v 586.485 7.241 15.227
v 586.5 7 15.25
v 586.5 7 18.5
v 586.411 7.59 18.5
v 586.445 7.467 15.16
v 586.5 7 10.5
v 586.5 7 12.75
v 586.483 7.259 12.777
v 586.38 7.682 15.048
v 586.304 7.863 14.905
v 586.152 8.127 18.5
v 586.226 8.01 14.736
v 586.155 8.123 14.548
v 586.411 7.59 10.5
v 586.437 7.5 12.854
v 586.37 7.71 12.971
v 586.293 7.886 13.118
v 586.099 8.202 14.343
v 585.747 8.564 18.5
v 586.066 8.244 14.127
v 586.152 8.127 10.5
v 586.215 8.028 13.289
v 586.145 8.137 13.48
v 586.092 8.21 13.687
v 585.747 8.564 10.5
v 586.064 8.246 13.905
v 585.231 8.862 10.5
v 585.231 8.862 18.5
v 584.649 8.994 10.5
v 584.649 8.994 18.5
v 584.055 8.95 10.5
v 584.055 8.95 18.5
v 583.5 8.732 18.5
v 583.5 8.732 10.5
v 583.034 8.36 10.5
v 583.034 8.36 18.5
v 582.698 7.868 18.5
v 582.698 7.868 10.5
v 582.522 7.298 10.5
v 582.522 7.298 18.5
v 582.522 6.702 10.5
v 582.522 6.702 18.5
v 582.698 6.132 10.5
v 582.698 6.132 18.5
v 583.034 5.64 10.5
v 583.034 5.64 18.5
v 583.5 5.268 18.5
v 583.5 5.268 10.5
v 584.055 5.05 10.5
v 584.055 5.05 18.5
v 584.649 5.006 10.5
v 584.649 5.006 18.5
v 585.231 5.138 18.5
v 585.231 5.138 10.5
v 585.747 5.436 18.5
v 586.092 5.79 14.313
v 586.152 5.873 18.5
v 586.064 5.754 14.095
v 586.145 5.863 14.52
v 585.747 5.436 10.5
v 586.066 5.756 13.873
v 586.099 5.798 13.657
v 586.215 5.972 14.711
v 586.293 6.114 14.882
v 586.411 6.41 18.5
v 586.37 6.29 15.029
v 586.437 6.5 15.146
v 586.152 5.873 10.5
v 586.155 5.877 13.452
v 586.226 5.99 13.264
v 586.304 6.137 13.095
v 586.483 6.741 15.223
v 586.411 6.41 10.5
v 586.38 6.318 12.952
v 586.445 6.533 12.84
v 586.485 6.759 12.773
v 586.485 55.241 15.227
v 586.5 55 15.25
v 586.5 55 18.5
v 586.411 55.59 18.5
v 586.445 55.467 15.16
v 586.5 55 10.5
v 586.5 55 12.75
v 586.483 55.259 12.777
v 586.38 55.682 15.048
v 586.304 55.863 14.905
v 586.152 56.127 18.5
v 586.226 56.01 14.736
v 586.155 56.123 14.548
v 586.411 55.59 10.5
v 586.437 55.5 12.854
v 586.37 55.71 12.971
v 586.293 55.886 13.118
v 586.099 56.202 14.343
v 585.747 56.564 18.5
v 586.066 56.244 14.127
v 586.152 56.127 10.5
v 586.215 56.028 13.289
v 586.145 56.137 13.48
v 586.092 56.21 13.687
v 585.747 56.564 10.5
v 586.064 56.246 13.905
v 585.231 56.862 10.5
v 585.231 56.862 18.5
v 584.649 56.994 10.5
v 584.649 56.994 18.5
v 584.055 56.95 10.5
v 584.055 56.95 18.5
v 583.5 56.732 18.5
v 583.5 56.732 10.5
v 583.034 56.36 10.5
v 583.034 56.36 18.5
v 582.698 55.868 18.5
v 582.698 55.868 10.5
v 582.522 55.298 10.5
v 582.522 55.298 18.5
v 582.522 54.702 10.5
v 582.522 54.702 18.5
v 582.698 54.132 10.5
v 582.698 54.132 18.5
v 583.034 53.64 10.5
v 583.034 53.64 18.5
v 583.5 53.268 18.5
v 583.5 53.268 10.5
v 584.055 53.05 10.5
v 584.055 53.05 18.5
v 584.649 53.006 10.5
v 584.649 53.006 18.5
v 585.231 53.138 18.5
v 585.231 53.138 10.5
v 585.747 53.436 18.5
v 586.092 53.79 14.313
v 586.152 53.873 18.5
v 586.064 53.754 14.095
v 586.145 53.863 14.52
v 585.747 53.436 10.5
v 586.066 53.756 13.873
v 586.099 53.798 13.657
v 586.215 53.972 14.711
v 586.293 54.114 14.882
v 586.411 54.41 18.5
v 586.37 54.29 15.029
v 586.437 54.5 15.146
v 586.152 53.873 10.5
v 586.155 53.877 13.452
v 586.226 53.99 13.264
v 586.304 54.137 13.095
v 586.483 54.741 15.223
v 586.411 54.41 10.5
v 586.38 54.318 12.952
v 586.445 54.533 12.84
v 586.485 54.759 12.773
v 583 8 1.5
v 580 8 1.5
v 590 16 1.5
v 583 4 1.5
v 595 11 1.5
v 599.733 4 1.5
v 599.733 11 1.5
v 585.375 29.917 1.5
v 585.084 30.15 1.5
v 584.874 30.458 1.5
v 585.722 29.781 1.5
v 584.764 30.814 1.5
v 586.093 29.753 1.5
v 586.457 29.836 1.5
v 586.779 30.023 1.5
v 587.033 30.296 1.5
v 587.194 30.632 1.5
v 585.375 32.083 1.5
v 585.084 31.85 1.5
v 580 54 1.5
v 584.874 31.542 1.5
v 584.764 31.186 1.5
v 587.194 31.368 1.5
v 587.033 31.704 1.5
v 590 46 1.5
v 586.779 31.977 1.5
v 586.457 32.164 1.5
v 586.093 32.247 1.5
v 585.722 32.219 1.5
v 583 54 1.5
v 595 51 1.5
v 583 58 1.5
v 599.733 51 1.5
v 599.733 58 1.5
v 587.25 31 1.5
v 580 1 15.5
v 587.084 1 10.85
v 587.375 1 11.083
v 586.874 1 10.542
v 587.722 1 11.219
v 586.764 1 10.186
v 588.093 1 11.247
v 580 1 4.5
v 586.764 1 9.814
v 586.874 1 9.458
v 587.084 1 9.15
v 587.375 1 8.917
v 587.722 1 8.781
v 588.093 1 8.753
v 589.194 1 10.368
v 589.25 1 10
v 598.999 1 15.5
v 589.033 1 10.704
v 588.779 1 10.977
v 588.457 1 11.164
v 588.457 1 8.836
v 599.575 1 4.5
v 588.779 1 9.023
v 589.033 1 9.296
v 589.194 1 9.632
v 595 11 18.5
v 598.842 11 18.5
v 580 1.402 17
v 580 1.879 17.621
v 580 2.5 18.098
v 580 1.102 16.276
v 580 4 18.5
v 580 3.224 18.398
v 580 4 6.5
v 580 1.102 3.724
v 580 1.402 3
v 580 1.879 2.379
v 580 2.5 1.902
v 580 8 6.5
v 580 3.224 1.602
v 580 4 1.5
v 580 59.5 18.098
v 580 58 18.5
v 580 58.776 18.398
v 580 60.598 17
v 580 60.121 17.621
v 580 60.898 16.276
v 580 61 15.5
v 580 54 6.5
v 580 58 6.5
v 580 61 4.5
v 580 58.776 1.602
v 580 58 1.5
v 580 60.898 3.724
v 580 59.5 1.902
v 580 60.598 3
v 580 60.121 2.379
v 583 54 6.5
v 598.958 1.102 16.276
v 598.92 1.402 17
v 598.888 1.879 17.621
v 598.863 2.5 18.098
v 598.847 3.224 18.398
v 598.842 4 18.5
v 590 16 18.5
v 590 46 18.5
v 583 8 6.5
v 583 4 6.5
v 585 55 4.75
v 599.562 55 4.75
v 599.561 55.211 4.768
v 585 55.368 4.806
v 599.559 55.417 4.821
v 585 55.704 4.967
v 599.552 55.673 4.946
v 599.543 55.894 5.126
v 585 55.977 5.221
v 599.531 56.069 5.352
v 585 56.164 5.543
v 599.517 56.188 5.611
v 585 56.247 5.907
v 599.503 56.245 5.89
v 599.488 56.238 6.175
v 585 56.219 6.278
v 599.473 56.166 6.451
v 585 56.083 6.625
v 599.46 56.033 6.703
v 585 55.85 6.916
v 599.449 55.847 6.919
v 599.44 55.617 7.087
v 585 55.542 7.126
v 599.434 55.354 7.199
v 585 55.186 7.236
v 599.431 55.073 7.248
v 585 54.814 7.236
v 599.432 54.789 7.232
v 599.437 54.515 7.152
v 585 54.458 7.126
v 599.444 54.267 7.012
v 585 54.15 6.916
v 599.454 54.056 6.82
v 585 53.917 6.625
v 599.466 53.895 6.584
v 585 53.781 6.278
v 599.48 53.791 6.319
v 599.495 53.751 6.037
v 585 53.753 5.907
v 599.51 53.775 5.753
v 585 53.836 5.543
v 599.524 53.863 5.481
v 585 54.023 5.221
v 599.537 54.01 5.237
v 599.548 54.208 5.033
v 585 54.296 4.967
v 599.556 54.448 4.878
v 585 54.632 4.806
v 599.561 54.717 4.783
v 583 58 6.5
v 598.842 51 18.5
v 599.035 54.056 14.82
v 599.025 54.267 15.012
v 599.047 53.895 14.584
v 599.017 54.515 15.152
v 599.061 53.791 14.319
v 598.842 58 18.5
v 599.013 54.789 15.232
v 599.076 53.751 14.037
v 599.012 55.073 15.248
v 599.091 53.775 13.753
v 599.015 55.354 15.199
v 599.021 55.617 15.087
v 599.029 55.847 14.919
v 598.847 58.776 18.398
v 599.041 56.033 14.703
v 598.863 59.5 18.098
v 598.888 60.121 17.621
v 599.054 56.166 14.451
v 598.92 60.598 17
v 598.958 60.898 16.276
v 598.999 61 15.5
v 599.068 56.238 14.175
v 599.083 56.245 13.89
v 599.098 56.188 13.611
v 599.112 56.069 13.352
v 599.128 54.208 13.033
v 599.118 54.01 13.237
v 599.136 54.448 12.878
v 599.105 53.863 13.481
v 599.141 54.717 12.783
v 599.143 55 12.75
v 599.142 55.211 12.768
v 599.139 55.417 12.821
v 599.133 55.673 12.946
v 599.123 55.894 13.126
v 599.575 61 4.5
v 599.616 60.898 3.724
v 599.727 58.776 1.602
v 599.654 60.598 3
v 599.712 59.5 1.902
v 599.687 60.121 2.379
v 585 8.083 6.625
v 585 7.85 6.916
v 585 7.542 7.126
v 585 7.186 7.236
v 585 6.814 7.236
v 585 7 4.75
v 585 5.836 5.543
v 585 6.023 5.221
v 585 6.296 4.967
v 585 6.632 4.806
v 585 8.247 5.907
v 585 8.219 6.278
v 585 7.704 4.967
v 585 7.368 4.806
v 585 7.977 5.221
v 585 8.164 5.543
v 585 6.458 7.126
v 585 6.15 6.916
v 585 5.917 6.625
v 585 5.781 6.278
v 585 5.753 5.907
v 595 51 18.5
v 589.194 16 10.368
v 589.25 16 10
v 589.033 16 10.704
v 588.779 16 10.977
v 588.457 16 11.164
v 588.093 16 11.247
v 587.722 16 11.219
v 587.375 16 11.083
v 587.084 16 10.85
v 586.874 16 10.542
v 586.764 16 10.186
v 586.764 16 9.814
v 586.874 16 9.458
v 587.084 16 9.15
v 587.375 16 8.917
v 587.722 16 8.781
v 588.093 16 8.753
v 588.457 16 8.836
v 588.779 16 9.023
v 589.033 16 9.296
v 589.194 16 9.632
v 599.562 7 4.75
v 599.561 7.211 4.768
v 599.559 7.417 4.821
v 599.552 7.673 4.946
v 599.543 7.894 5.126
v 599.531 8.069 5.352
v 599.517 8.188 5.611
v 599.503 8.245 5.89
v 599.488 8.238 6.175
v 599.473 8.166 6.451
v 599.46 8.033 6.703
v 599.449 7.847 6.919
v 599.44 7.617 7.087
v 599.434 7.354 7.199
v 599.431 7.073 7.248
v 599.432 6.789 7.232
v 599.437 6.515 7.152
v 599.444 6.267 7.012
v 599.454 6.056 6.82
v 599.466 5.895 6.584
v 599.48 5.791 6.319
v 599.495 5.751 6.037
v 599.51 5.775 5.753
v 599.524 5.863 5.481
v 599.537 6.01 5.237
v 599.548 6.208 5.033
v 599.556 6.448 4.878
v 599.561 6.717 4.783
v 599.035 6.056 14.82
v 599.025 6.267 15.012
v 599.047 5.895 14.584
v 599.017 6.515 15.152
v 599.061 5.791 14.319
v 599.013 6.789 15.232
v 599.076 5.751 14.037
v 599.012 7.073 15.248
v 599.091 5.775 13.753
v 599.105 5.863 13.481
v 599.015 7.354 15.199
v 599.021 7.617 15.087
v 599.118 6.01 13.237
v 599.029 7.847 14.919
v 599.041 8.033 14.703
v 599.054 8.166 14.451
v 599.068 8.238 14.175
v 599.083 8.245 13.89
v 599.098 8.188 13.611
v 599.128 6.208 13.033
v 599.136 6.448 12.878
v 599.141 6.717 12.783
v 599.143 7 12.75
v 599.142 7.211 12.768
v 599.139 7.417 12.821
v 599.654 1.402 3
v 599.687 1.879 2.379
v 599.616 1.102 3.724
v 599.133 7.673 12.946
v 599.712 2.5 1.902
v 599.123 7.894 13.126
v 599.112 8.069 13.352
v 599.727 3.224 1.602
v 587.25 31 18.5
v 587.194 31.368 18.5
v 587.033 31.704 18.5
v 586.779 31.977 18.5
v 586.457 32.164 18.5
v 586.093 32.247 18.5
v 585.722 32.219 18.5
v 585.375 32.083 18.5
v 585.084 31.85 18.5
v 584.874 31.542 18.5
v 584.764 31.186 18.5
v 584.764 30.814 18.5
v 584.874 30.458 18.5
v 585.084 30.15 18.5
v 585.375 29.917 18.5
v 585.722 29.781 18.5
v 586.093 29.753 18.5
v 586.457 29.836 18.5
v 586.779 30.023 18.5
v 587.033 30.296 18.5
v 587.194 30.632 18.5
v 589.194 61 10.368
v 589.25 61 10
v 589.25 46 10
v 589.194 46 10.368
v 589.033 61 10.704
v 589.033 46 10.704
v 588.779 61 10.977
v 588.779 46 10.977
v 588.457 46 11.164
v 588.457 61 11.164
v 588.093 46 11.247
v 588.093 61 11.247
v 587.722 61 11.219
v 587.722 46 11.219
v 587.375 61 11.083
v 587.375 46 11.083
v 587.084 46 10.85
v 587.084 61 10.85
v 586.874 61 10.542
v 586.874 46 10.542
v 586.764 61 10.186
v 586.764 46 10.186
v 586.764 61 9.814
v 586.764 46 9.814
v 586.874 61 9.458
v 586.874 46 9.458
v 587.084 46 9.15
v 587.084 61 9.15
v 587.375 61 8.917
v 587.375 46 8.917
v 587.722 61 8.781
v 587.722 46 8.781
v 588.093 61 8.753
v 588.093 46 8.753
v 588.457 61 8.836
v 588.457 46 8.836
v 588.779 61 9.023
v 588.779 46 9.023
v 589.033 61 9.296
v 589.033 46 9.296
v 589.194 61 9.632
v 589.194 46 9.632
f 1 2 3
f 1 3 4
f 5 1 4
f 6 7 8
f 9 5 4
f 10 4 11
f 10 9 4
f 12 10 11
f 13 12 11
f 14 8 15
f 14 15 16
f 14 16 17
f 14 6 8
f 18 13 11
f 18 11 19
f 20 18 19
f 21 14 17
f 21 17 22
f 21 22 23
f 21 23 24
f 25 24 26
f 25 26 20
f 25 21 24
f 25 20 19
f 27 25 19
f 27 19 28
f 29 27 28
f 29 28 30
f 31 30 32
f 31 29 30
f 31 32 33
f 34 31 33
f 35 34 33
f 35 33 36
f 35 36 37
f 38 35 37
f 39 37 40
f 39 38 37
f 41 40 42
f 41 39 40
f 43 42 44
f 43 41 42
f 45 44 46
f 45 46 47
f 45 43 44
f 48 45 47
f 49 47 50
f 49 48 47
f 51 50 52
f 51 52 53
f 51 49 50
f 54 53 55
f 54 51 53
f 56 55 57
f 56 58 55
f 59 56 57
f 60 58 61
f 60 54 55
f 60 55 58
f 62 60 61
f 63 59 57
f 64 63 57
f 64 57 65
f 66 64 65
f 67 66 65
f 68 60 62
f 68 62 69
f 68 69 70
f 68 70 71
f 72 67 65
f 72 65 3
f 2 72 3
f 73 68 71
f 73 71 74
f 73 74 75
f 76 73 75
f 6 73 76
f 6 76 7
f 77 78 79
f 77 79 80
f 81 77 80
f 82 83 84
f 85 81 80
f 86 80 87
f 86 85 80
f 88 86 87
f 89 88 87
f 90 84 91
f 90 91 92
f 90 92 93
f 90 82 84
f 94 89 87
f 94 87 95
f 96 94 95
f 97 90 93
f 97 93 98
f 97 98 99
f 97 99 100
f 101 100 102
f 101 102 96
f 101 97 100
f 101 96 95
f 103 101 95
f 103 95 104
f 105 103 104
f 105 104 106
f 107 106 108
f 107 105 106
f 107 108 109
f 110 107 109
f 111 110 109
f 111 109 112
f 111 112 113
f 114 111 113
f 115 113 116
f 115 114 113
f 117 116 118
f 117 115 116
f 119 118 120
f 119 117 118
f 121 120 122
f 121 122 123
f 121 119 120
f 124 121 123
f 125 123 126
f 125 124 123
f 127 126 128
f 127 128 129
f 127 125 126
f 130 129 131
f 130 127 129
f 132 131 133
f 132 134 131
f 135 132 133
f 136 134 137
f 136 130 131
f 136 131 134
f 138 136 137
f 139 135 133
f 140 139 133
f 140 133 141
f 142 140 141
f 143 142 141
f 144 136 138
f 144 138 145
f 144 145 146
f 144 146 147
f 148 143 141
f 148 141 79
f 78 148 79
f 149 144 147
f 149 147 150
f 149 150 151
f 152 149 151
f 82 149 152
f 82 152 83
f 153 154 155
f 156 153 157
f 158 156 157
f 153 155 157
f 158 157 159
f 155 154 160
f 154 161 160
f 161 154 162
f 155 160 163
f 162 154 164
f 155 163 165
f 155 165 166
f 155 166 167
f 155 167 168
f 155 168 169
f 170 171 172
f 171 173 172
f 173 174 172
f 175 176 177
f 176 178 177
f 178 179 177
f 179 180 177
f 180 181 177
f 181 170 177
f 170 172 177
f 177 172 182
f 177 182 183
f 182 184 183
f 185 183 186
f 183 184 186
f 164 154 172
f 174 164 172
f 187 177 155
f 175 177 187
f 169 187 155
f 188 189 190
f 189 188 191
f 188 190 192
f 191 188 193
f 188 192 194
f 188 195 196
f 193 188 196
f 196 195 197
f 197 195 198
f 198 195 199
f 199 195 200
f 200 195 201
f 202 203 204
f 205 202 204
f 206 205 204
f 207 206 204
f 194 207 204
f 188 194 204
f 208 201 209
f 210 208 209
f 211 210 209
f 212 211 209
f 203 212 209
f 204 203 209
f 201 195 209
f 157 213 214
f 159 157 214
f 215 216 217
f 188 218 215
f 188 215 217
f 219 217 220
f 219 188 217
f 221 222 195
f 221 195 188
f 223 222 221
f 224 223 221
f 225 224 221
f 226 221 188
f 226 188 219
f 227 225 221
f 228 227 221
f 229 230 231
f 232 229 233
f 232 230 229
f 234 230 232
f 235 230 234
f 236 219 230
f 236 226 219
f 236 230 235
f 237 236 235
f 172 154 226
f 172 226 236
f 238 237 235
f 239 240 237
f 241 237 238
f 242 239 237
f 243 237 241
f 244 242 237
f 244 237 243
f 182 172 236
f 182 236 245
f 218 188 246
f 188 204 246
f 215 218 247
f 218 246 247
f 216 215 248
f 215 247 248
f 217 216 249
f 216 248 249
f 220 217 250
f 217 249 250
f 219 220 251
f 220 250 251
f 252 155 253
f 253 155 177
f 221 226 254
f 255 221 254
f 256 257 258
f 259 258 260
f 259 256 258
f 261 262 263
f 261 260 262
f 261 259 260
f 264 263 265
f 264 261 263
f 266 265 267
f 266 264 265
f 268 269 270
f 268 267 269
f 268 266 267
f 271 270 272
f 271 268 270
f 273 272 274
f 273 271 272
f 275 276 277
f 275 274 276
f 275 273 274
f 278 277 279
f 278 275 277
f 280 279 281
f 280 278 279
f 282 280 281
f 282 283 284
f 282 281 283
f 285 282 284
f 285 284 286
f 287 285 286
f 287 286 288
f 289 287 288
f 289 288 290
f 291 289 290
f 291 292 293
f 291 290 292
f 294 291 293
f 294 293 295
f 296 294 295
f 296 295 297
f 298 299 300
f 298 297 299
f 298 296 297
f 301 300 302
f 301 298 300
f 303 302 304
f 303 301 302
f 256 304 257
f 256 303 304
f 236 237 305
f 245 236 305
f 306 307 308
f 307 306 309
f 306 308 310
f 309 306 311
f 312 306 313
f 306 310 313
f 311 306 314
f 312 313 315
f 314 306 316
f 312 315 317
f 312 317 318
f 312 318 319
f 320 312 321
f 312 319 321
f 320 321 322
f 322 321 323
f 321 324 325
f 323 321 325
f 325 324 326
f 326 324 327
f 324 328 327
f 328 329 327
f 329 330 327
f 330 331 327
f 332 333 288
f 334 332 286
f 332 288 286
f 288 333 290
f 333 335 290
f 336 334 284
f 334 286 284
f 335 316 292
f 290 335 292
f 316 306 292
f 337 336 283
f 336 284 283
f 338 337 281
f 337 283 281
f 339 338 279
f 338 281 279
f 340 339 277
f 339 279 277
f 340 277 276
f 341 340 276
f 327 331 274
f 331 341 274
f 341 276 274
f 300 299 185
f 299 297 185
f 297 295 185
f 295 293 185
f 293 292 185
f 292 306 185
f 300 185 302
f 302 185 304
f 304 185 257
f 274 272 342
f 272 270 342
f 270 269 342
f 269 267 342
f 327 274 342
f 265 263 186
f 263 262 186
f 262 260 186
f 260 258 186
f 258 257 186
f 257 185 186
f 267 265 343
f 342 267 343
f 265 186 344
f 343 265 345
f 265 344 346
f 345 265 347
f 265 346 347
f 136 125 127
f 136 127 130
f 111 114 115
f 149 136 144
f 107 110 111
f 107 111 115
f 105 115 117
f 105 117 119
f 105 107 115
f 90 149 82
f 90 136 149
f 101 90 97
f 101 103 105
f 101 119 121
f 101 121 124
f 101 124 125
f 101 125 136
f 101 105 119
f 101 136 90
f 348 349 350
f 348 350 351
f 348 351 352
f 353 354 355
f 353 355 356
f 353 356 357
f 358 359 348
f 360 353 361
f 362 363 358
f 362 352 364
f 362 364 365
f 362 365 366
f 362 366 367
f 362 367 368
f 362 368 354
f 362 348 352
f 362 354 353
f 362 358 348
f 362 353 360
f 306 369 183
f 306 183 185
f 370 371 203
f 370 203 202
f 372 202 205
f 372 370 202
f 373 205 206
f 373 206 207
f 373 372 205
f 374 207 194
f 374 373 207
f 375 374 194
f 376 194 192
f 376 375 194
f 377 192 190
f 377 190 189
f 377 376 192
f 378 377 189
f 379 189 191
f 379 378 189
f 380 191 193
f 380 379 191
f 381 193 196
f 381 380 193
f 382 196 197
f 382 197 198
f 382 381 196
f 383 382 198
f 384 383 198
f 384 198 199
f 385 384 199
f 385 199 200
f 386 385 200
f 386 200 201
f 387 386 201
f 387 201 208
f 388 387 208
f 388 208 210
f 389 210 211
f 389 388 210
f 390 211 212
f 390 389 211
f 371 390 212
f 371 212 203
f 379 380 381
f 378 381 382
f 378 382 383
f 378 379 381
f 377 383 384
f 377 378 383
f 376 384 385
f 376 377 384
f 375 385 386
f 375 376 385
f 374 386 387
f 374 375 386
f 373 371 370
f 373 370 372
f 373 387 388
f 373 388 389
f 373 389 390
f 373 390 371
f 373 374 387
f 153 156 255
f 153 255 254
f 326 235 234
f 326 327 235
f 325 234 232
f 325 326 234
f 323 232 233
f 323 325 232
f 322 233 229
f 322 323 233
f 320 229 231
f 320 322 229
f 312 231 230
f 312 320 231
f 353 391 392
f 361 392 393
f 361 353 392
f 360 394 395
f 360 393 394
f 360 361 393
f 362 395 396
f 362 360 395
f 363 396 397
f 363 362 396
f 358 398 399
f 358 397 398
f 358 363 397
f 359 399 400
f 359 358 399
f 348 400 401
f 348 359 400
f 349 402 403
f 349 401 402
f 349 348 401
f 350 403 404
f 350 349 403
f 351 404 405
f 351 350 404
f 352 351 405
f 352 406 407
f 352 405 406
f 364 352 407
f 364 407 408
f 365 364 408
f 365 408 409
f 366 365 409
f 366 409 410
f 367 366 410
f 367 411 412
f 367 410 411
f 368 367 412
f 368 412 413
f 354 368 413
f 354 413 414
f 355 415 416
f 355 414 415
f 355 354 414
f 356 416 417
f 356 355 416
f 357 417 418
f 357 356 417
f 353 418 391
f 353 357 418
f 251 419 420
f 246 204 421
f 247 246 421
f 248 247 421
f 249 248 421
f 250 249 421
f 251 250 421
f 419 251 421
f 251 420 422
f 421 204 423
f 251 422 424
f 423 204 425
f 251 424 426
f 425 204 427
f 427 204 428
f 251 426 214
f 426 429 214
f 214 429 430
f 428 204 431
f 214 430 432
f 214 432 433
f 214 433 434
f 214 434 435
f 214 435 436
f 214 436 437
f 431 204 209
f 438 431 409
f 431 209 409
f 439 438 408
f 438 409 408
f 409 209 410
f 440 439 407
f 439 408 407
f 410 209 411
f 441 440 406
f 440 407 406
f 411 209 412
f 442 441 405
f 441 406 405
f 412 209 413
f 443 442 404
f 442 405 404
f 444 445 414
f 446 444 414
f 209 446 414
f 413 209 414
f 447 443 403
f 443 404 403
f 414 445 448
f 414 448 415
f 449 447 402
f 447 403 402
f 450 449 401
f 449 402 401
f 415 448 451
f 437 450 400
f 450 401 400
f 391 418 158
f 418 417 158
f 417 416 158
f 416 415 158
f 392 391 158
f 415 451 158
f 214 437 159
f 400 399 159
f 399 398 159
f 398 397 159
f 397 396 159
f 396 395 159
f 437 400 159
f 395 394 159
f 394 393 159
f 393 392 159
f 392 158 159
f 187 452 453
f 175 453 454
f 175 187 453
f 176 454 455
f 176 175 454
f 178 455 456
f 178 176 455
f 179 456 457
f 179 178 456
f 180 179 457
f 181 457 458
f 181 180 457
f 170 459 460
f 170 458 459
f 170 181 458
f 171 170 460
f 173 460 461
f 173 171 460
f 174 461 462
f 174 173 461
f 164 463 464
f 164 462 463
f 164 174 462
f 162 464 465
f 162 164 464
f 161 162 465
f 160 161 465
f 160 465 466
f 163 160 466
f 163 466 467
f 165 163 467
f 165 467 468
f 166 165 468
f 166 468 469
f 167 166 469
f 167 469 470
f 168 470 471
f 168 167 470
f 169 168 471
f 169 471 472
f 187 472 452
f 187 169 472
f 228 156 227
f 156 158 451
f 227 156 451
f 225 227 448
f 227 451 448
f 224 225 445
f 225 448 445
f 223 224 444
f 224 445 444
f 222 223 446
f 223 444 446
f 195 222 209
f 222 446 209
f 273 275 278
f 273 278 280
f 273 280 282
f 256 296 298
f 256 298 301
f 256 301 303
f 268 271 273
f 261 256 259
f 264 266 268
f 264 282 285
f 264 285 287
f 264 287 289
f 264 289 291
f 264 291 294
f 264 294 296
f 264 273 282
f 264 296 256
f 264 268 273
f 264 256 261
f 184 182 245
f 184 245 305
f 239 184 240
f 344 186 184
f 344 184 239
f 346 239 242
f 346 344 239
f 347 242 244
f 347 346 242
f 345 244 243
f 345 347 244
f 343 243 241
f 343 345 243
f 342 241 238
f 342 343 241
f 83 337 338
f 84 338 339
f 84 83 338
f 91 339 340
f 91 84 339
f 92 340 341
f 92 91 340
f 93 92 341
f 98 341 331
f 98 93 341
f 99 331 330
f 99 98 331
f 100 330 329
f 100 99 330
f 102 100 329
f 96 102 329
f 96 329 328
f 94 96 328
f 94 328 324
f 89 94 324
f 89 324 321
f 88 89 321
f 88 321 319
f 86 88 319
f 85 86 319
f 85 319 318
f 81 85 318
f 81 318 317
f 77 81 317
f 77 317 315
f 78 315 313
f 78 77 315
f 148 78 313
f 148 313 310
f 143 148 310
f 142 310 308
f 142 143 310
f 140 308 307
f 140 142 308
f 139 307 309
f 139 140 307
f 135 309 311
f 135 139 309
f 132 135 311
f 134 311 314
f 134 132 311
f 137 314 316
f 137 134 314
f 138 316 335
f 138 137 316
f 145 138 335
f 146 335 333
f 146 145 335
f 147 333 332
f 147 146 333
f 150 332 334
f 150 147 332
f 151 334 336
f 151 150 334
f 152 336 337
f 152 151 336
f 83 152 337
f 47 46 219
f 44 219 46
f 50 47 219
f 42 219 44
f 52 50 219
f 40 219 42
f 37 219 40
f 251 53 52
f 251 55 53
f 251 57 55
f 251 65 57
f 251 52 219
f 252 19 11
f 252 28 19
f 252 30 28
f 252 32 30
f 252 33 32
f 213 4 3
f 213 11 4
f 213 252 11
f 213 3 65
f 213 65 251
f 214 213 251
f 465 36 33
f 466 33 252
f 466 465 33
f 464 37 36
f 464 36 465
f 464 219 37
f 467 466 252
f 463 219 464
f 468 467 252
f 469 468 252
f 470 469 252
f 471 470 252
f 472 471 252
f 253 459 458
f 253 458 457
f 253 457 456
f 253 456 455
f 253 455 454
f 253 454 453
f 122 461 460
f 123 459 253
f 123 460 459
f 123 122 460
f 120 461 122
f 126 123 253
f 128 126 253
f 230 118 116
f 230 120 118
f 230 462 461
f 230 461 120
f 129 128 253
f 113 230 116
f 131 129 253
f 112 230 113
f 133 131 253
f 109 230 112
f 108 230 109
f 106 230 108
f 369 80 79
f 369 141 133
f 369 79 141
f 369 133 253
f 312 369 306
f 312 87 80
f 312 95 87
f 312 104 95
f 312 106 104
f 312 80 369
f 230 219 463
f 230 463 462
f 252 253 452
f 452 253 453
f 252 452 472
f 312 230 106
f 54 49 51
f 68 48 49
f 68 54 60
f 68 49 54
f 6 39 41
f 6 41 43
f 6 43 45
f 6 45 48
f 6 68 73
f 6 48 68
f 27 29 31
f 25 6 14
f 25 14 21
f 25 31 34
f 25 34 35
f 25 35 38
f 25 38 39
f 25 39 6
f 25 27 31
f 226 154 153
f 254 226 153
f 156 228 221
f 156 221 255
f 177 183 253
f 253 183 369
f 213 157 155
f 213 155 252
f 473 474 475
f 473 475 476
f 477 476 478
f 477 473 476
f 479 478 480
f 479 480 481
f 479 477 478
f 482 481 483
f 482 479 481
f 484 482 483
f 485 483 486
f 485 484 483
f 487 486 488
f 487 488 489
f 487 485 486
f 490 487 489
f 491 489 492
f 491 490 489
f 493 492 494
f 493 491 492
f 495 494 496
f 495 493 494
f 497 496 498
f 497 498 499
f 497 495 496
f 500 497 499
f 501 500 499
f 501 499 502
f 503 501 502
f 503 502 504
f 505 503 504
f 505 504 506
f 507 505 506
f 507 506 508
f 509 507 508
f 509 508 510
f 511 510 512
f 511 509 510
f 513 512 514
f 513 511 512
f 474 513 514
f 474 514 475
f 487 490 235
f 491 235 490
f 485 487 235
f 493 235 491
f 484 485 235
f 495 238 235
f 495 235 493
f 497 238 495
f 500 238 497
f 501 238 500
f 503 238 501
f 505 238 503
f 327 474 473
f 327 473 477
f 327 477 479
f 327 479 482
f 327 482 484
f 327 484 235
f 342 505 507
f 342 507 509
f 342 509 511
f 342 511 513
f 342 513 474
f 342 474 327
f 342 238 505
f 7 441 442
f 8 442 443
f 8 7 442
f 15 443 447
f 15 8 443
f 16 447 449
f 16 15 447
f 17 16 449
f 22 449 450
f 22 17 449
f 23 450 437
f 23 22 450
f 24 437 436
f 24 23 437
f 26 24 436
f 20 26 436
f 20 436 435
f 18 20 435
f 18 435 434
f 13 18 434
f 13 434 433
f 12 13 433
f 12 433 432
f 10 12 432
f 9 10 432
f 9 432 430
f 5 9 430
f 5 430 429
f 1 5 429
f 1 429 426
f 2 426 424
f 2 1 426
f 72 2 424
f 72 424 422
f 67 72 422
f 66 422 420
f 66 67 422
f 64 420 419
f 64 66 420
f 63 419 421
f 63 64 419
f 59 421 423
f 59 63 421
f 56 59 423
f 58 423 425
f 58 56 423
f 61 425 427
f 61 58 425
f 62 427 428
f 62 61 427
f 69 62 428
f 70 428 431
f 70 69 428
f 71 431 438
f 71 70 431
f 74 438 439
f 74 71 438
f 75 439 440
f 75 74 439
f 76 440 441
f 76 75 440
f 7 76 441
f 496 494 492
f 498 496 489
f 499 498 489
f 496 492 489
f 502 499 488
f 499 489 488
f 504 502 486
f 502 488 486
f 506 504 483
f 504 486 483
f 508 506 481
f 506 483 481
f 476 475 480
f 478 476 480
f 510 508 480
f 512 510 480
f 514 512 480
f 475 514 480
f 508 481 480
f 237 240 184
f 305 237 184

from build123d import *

# Parameters (mm, degrees)
CYLINDER188_R          = 2
CYLINDER188_DEPTH      = 8
CYLINDER189_R          = 2
CYLINDER189_DEPTH      = 8
CYLINDER187_R          = 1.25
CYLINDER187_DEPTH      = 20
BOX018_W               = 3
BOX018_H               = 4
BOX018_DEPTH           = 5
BOX019_W               = 3
BOX019_H               = 4
BOX019_DEPTH           = 5
CYLINDER041_R          = 1.25
CYLINDER041_DEPTH      = 15
CYLINDER040_R          = 1.25
CYLINDER040_DEPTH      = 15
CYLINDER039_R          = 1.25
CYLINDER039_DEPTH      = 15
CYLINDER038_R          = 1.25
CYLINDER038_DEPTH      = 15
CYLINDER037_R          = 1.25
CYLINDER037_DEPTH      = 15
CYLINDER036_R          = 1.25
CYLINDER036_DEPTH      = 15
BOX015_W               = 10
BOX015_H               = 62
BOX015_DEPTH           = 32
BOX015_PLACEMENT_ANGLE = 3
BOX016_W               = 20
BOX016_H               = 10
BOX016_DEPTH           = 17
BOX017_W               = 10
BOX017_H               = 40
BOX017_DEPTH           = 17
BOX014_W               = 10
BOX014_H               = 62
BOX014_DEPTH           = 32
BOX014_PLACEMENT_ANGLE = 3
BOX013_W               = 20
BOX013_H               = 10
BOX013_DEPTH           = 17
CHAMFER_SIZE           = 5
CHAMFER001_SIZE        = 5
FILLET007_R            = 3
FILLET008_R            = 3


with BuildPart() as cylinder188:
    # Cylinder188 → Cylinder188 (new body)
    with BuildSketch(Plane(origin=(584, 7, 10.5), x_dir=(1, 0, 0), z_dir=(0, 0, 1))):
        Circle(CYLINDER188_R)
    extrude(amount=CYLINDER188_DEPTH)


with BuildPart() as fusion159:
    # Cylinder189 → Cylinder189 (new body)
    with BuildSketch(Plane(origin=(584, 55, 10.5), x_dir=(1, 0, 0), z_dir=(0, 0, 1))):
        Circle(CYLINDER189_R)
    extrude(amount=CYLINDER189_DEPTH)

    # Fusion159: union Cylinder188
    add(cylinder188.part)


with BuildPart() as fusion159_1:
    # Fusion159 placement: moved
    add(fusion159.part.moved(Location((0.5, 0, 0))))


with BuildPart() as cylinder187:
    # Cylinder187 → Cylinder187 (new body)
    with BuildSketch(Plane(origin=(586, 31, 1.5), x_dir=(1, 0, 0), z_dir=(0, 0, 1))):
        Circle(CYLINDER187_R)
    extrude(amount=CYLINDER187_DEPTH)


with BuildPart() as box018:
    # Box018 → Box018 (new body)
    with BuildSketch(Plane(origin=(580, 4, 1.5), x_dir=(1, 0, 0), z_dir=(0, 0, 1))):
        with Locations((1.5, 2)):
            Rectangle(BOX018_W, BOX018_H)
    extrude(amount=BOX018_DEPTH)


with BuildPart() as fusion032:
    # Box019 → Box019 (new body)
    with BuildSketch(Plane(origin=(580, 54, 1.5), x_dir=(1, 0, 0), z_dir=(0, 0, 1))):
        with Locations((1.5, 2)):
            Rectangle(BOX019_W, BOX019_H)
    extrude(amount=BOX019_DEPTH)

    # Fusion032: union Box018
    add(box018.part)


with BuildPart() as cylinder041:
    # Cylinder041 → Cylinder041 (new body)
    with BuildSketch(Plane(origin=(585, 7, 6), x_dir=(0, 0, -1), z_dir=(1, 0, 0))):
        Circle(CYLINDER041_R)
    extrude(amount=CYLINDER041_DEPTH)


with BuildPart() as fusion030:
    # Cylinder040 → Cylinder040 (new body)
    with BuildSketch(Plane(origin=(585, 7, 14), x_dir=(0, 0, -1), z_dir=(1, 0, 0))):
        Circle(CYLINDER040_R)
    extrude(amount=CYLINDER040_DEPTH)

    # Fusion030: union Cylinder041
    add(cylinder041.part)


with BuildPart() as fusion030_1:
    # Fusion030 placement: moved
    add(fusion030.part.moved(Location((0, 48, 0))))


with BuildPart() as cylinder039:
    # Cylinder039 → Cylinder039 (new body)
    with BuildSketch(Plane(origin=(585, 7, 6), x_dir=(0, 0, -1), z_dir=(1, 0, 0))):
        Circle(CYLINDER039_R)
    extrude(amount=CYLINDER039_DEPTH)


with BuildPart() as fusion031:
    # Cylinder038 → Cylinder038 (new body)
    with BuildSketch(Plane(origin=(585, 7, 14), x_dir=(0, 0, -1), z_dir=(1, 0, 0))):
        Circle(CYLINDER038_R)
    extrude(amount=CYLINDER038_DEPTH)

    # Fusion029: union Cylinder039
    add(cylinder039.part)

    # Fusion031: union Fusion030
    add(fusion030_1.part)


with BuildPart() as cylinder037:
    # Cylinder037 → Cylinder037 (new body)
    with BuildSketch(Plane(origin=(588, 61, 10), x_dir=(1, 0, 0), z_dir=(0, -1, 0))):
        Circle(CYLINDER037_R)
    extrude(amount=CYLINDER037_DEPTH)


with BuildPart() as fusion028:
    # Cylinder036 → Cylinder036 (new body)
    with BuildSketch(Plane(origin=(588, 16, 10), x_dir=(1, 0, 0), z_dir=(0, -1, 0))):
        Circle(CYLINDER036_R)
    extrude(amount=CYLINDER036_DEPTH)

    # Fusion028: union Cylinder037
    add(cylinder037.part)


with BuildPart() as box015:
    # Box015 → Box015 (new body)
    with BuildSketch(Plane.XY):
        with Locations((5, 31)):
            Rectangle(BOX015_W, BOX015_H)
    extrude(amount=BOX015_DEPTH)


with BuildPart() as box015_1:
    # Box015 placement: moved
    add(box015.part.moved(Location((600, 0, -3.6))).rotate(Axis((600, 0, -3.6), (0, -1, 0)), BOX015_PLACEMENT_ANGLE))


with BuildPart() as cut012:
    # Box016 → Box016 (new body)
    with BuildSketch(Plane(origin=(580, 0, 1.5), x_dir=(1, 0, 0), z_dir=(0, 0, 1))):
        with Locations((10, 5)):
            Rectangle(BOX016_W, BOX016_H)
    extrude(amount=BOX016_DEPTH)

    # Cut012: cut Box015
    add(box015_1.part, mode=Mode.SUBTRACT)


with BuildPart() as cut012_1:
    # Cut012 placement: moved
    add(cut012.part.moved(Location((0, 51, 0))))


with BuildPart() as box017:
    # Box017 → Box017 (new body)
    with BuildSketch(Plane(origin=(580, 11, 1.5), x_dir=(1, 0, 0), z_dir=(0, 0, 1))):
        with Locations((5, 20)):
            Rectangle(BOX017_W, BOX017_H)
    extrude(amount=BOX017_DEPTH)


with BuildPart() as box014:
    # Box014 → Box014 (new body)
    with BuildSketch(Plane.XY):
        with Locations((5, 31)):
            Rectangle(BOX014_W, BOX014_H)
    extrude(amount=BOX014_DEPTH)


with BuildPart() as box014_1:
    # Box014 placement: moved
    add(box014.part.moved(Location((600, 0, -3.6))).rotate(Axis((600, 0, -3.6), (0, -1, 0)), BOX014_PLACEMENT_ANGLE))


with BuildPart() as rear_cross_member:
    # Box013 → Box013 (new body)
    with BuildSketch(Plane(origin=(580, 0, 1.5), x_dir=(1, 0, 0), z_dir=(0, 0, 1))):
        with Locations((10, 5)):
            Rectangle(BOX013_W, BOX013_H)
    extrude(amount=BOX013_DEPTH)

    # Cut011: cut Box014
    add(box014_1.part, mode=Mode.SUBTRACT)


with BuildPart() as rear_cross_member_1:
    # Cut011 placement: moved
    add(rear_cross_member.part.moved(Location((0, 1, 0))))

    # Fusion022: union Cut012, Box017
    add(cut012_1.part)
    add(box017.part)

    # Chamfer
    chamfer_edges = [rear_cross_member_1.edges().sort_by_distance(p)[0] for p in [
        (590, 11, 10),
    ]]
    chamfer(chamfer_edges, length=CHAMFER_SIZE)

    # Chamfer001
    chamfer001_edges = [rear_cross_member_1.edges().sort_by_distance(p)[0] for p in [
        (590, 51, 10),
    ]]
    chamfer(chamfer001_edges, length=CHAMFER001_SIZE)

    # Fillet007
    fillet007_edges = [rear_cross_member_1.edges().sort_by_distance(p)[0] for p in [
        (589.86636, 61, 1.5),
        (589.420894, 61, 18.5),
    ]]
    fillet(fillet007_edges, radius=FILLET007_R)

    # Fillet008
    fillet008_edges = [rear_cross_member_1.edges().sort_by_distance(p)[0] for p in [
        (589.86636, 1, 1.5),
        (589.420894, 1, 18.5),
    ]]
    fillet(fillet008_edges, radius=FILLET008_R)

    # Cut015: cut Fusion028
    add(fusion028.part, mode=Mode.SUBTRACT)

    # Cut016: cut Fusion031
    add(fusion031.part, mode=Mode.SUBTRACT)

    # Cut017: cut Fusion032
    add(fusion032.part, mode=Mode.SUBTRACT)

    # Cut120: cut Cylinder187
    add(cylinder187.part, mode=Mode.SUBTRACT)

    # Cut121: cut Fusion159
    add(fusion159_1.part, mode=Mode.SUBTRACT)


solid = rear_cross_member_1.part
